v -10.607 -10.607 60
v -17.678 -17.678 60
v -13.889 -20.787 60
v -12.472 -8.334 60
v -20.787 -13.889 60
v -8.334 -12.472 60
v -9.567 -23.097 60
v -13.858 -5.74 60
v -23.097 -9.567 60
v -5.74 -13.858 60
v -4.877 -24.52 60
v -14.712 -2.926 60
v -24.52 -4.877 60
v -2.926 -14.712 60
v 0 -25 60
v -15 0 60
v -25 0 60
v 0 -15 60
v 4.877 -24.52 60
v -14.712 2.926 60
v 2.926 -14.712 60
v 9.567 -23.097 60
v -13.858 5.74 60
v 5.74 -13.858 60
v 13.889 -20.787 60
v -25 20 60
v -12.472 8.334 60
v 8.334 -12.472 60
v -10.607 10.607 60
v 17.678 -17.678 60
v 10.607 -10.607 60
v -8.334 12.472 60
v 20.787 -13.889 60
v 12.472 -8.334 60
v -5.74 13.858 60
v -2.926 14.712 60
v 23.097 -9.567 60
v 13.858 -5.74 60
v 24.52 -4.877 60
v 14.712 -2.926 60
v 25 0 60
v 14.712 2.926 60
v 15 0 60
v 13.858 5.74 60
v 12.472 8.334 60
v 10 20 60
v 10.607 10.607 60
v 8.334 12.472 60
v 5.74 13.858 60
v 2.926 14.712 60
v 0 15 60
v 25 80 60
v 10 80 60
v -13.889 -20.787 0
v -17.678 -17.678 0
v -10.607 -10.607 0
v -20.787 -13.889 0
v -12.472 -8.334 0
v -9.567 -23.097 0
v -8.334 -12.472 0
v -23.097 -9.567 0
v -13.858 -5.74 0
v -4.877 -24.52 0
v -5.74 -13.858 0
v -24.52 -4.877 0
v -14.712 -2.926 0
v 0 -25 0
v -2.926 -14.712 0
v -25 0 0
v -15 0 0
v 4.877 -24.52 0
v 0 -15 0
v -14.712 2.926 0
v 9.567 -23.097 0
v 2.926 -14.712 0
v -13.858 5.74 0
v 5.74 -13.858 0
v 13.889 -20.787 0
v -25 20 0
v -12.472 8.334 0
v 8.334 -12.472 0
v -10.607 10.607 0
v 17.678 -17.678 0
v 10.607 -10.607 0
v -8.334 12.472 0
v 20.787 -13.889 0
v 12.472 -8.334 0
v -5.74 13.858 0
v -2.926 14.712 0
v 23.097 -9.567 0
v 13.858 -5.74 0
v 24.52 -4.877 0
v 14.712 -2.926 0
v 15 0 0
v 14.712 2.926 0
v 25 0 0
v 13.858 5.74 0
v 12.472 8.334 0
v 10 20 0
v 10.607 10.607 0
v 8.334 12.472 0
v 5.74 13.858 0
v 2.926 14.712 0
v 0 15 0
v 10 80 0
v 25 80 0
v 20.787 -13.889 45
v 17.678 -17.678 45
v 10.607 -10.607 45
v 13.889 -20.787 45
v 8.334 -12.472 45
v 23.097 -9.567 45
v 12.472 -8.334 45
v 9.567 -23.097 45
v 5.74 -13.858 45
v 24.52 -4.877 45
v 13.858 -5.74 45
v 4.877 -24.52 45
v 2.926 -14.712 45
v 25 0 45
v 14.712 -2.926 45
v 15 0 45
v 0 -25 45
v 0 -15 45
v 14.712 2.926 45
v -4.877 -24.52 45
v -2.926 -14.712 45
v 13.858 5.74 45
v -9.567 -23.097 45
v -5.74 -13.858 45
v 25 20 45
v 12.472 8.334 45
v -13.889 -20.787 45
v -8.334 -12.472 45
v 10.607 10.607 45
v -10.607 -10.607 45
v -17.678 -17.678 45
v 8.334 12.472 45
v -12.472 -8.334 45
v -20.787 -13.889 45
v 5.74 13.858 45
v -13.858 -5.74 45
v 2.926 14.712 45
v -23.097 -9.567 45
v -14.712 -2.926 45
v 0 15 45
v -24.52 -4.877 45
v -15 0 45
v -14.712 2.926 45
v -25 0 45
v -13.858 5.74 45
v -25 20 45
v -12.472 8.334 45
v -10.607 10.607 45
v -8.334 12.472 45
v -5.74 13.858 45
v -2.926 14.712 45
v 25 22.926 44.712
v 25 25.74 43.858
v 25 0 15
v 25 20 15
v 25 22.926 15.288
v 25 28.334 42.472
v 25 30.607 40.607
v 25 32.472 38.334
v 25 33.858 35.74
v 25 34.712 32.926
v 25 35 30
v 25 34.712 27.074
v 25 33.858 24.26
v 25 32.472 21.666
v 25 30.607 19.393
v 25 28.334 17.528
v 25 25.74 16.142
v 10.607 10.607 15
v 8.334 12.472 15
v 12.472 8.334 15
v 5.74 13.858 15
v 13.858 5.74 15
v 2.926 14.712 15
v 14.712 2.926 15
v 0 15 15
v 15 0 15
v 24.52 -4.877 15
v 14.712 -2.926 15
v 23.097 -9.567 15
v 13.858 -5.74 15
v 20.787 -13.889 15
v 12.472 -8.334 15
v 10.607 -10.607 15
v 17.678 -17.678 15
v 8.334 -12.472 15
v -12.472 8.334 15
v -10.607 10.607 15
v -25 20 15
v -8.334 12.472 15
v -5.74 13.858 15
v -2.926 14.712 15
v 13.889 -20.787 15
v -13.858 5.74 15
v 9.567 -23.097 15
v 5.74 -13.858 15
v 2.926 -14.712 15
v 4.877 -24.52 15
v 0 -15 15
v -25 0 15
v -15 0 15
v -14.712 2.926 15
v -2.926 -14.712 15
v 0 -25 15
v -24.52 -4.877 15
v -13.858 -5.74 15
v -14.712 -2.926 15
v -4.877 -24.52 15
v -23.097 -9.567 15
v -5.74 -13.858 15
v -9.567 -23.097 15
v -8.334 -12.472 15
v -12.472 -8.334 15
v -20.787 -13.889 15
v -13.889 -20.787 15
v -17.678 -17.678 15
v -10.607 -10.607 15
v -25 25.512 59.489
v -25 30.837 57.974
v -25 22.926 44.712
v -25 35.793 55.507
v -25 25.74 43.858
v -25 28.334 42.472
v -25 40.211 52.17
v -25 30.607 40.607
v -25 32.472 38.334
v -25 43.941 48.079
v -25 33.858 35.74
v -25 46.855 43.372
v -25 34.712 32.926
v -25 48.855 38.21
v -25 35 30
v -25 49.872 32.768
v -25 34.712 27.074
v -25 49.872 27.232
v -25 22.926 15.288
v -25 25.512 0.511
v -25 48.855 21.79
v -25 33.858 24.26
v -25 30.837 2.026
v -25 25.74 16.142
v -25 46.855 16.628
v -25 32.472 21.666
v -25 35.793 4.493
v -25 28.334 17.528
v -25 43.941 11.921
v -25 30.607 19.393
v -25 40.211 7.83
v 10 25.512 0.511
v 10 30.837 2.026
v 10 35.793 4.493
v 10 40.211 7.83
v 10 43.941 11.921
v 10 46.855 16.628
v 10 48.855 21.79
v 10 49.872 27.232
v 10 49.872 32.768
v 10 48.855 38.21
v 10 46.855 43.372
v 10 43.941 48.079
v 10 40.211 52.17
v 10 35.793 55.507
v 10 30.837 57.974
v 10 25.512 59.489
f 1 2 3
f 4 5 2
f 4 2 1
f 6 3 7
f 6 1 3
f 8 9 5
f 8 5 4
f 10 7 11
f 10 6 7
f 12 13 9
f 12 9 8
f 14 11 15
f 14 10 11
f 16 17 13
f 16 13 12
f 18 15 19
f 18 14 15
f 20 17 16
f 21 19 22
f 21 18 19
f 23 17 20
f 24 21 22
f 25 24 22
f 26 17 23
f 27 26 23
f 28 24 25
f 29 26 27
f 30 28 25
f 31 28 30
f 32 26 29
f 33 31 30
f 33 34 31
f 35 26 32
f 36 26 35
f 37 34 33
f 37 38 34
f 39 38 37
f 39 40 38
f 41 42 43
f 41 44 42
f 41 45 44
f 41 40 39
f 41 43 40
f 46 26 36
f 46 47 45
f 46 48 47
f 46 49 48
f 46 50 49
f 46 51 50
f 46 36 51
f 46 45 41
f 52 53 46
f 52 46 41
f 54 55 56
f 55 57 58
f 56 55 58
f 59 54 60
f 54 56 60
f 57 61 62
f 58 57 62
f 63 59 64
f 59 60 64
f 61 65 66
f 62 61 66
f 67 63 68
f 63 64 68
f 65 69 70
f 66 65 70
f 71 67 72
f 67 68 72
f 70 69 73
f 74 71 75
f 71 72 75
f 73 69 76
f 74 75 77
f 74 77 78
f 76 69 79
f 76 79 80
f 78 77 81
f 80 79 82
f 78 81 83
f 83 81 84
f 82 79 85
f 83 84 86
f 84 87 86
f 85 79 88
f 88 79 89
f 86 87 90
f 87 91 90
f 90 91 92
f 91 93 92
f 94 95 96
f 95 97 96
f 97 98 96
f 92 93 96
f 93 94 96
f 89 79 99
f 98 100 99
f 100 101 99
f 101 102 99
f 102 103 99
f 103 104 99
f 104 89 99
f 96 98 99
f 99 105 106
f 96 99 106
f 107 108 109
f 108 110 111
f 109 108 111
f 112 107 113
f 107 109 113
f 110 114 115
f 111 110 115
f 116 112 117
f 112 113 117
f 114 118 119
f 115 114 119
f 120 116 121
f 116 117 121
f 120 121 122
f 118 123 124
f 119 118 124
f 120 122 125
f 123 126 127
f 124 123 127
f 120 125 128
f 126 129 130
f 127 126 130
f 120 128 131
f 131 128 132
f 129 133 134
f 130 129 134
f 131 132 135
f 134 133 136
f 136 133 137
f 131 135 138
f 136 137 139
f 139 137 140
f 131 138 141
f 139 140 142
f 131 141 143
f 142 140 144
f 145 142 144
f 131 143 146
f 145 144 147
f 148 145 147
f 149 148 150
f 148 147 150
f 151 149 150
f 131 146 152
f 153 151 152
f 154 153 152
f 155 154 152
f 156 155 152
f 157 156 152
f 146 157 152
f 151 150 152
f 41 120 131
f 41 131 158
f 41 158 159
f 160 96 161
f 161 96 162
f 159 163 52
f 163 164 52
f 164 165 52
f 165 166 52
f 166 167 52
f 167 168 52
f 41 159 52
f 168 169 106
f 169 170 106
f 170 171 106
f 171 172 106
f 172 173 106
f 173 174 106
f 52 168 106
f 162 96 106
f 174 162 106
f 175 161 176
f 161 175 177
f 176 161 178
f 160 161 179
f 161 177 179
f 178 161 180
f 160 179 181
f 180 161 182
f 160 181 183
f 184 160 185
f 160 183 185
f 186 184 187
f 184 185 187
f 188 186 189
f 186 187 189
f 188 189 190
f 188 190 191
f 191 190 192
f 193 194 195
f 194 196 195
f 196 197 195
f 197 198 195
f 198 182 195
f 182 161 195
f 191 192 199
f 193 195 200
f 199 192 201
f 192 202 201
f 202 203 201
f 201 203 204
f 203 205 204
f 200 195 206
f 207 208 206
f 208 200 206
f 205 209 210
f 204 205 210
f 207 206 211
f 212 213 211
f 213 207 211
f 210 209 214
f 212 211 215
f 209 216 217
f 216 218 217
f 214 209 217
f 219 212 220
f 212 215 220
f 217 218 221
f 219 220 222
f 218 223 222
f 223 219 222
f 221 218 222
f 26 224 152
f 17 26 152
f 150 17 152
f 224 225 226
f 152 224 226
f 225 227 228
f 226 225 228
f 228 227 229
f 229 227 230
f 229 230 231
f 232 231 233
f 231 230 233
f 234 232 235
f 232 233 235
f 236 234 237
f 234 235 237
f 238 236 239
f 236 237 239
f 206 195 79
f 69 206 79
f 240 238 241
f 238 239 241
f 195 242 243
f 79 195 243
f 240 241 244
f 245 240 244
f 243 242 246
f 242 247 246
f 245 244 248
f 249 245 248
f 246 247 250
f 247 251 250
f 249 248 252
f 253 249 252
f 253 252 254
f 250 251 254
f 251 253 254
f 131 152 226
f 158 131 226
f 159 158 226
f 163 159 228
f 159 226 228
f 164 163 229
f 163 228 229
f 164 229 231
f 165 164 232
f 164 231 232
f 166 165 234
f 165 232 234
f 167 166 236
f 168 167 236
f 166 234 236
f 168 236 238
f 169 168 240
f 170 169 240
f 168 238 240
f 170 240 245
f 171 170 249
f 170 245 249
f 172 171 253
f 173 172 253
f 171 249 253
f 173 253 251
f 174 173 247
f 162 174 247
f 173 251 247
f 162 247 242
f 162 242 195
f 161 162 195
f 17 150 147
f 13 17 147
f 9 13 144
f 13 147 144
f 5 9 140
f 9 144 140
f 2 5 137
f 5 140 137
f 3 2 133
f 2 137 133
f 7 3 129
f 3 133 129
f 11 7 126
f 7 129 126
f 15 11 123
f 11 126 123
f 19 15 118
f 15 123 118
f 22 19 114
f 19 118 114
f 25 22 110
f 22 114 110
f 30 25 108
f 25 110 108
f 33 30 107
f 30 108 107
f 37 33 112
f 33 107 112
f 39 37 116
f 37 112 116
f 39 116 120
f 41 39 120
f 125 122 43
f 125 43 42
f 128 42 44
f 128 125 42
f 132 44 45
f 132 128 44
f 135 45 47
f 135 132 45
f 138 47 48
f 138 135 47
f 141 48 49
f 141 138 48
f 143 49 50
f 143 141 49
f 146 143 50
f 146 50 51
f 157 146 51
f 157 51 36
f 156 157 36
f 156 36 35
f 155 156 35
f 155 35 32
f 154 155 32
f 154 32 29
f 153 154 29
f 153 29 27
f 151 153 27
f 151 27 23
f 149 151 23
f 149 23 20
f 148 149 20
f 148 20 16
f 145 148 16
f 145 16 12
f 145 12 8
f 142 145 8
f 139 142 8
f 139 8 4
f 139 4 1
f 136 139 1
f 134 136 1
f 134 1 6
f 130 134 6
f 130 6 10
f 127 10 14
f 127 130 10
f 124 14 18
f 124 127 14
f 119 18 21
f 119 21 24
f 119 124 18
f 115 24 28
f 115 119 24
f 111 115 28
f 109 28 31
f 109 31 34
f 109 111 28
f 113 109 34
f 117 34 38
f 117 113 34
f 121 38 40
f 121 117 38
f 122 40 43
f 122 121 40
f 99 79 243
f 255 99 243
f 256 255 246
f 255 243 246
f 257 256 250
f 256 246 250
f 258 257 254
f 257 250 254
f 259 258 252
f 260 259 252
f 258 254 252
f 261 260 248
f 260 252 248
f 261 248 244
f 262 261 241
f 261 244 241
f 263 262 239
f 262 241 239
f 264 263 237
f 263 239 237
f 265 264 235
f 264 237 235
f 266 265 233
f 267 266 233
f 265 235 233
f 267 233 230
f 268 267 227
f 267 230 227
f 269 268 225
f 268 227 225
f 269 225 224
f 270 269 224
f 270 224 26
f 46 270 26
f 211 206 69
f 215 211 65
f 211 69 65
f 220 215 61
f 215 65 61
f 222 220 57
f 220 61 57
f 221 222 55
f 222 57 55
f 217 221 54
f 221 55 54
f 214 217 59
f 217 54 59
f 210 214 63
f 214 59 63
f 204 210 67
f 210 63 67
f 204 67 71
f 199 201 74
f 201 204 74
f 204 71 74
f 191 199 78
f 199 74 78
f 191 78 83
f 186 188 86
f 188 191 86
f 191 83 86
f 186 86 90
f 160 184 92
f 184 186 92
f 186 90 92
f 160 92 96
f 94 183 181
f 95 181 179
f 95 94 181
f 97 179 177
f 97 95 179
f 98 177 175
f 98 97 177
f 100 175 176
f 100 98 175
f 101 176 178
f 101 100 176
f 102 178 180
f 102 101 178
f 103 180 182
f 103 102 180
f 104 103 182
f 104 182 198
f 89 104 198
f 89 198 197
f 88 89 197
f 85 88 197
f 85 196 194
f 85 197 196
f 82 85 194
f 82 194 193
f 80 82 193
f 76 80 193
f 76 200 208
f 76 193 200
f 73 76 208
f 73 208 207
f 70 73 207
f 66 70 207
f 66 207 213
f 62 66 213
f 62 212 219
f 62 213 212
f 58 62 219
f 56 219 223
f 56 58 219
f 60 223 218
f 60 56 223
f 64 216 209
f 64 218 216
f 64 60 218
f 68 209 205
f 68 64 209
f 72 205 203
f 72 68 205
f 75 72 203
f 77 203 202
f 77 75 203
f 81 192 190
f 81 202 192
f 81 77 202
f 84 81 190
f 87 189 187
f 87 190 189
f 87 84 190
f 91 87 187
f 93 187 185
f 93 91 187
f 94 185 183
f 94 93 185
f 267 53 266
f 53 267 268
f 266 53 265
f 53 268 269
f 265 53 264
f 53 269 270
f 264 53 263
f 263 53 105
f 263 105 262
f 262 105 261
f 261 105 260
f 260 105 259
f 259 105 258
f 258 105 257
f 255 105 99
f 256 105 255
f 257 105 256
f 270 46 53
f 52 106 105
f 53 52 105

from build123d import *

# Parameters (mm, degrees)
SKETCH1_R           = 15
BOSS_EXTRUDE1_DEPTH = 60
BOSS_EXTRUDE2_DEPTH = 35
CUT_EXTRUDE9_DEPTH  = 68


with BuildPart() as part:
    # Sketch1 → Boss-Extrude1 (new body)
    with BuildSketch(Plane.XY):
        with BuildLine():
            Line((25, 0), (25, 80))
            Line((25, 80), (10, 80))
            Line((10, 80), (10, 20))
            Line((10, 20), (-25, 20))
            Line((-25, 20), (-25, 0))
            ThreePointArc((-25, 0), (0, -25), (25, 0))
        make_face()
        Circle(SKETCH1_R, mode=Mode.SUBTRACT)
    extrude(amount=BOSS_EXTRUDE1_DEPTH)

    # Sketch2 → Boss-Extrude2 (add)
    with BuildSketch(Plane.ZY.offset(25)):
        with BuildLine():
            Line((15, 20), (0, 20))
            ThreePointArc((0, 20), (30, 50), (60, 20))
            Line((60, 20), (45, 20))
            ThreePointArc((45, 20), (30, 35), (15, 20))
        make_face()
    extrude(amount=-BOSS_EXTRUDE2_DEPTH)

    # Sketch4 → Cut-Extrude9 (cut)
    with BuildSketch(Plane.ZY.offset(25)):
        with BuildLine():
            Line((15, 20), (15, -31.386315339))
            Line((15, -31.386315339), (45, -31.386315339))
            Line((45, -31.386315339), (45, 20))
            ThreePointArc((45, 20), (30, 35), (15, 20))
        make_face()
    extrude(amount=-CUT_EXTRUDE9_DEPTH, mode=Mode.SUBTRACT)


solid = part.part
